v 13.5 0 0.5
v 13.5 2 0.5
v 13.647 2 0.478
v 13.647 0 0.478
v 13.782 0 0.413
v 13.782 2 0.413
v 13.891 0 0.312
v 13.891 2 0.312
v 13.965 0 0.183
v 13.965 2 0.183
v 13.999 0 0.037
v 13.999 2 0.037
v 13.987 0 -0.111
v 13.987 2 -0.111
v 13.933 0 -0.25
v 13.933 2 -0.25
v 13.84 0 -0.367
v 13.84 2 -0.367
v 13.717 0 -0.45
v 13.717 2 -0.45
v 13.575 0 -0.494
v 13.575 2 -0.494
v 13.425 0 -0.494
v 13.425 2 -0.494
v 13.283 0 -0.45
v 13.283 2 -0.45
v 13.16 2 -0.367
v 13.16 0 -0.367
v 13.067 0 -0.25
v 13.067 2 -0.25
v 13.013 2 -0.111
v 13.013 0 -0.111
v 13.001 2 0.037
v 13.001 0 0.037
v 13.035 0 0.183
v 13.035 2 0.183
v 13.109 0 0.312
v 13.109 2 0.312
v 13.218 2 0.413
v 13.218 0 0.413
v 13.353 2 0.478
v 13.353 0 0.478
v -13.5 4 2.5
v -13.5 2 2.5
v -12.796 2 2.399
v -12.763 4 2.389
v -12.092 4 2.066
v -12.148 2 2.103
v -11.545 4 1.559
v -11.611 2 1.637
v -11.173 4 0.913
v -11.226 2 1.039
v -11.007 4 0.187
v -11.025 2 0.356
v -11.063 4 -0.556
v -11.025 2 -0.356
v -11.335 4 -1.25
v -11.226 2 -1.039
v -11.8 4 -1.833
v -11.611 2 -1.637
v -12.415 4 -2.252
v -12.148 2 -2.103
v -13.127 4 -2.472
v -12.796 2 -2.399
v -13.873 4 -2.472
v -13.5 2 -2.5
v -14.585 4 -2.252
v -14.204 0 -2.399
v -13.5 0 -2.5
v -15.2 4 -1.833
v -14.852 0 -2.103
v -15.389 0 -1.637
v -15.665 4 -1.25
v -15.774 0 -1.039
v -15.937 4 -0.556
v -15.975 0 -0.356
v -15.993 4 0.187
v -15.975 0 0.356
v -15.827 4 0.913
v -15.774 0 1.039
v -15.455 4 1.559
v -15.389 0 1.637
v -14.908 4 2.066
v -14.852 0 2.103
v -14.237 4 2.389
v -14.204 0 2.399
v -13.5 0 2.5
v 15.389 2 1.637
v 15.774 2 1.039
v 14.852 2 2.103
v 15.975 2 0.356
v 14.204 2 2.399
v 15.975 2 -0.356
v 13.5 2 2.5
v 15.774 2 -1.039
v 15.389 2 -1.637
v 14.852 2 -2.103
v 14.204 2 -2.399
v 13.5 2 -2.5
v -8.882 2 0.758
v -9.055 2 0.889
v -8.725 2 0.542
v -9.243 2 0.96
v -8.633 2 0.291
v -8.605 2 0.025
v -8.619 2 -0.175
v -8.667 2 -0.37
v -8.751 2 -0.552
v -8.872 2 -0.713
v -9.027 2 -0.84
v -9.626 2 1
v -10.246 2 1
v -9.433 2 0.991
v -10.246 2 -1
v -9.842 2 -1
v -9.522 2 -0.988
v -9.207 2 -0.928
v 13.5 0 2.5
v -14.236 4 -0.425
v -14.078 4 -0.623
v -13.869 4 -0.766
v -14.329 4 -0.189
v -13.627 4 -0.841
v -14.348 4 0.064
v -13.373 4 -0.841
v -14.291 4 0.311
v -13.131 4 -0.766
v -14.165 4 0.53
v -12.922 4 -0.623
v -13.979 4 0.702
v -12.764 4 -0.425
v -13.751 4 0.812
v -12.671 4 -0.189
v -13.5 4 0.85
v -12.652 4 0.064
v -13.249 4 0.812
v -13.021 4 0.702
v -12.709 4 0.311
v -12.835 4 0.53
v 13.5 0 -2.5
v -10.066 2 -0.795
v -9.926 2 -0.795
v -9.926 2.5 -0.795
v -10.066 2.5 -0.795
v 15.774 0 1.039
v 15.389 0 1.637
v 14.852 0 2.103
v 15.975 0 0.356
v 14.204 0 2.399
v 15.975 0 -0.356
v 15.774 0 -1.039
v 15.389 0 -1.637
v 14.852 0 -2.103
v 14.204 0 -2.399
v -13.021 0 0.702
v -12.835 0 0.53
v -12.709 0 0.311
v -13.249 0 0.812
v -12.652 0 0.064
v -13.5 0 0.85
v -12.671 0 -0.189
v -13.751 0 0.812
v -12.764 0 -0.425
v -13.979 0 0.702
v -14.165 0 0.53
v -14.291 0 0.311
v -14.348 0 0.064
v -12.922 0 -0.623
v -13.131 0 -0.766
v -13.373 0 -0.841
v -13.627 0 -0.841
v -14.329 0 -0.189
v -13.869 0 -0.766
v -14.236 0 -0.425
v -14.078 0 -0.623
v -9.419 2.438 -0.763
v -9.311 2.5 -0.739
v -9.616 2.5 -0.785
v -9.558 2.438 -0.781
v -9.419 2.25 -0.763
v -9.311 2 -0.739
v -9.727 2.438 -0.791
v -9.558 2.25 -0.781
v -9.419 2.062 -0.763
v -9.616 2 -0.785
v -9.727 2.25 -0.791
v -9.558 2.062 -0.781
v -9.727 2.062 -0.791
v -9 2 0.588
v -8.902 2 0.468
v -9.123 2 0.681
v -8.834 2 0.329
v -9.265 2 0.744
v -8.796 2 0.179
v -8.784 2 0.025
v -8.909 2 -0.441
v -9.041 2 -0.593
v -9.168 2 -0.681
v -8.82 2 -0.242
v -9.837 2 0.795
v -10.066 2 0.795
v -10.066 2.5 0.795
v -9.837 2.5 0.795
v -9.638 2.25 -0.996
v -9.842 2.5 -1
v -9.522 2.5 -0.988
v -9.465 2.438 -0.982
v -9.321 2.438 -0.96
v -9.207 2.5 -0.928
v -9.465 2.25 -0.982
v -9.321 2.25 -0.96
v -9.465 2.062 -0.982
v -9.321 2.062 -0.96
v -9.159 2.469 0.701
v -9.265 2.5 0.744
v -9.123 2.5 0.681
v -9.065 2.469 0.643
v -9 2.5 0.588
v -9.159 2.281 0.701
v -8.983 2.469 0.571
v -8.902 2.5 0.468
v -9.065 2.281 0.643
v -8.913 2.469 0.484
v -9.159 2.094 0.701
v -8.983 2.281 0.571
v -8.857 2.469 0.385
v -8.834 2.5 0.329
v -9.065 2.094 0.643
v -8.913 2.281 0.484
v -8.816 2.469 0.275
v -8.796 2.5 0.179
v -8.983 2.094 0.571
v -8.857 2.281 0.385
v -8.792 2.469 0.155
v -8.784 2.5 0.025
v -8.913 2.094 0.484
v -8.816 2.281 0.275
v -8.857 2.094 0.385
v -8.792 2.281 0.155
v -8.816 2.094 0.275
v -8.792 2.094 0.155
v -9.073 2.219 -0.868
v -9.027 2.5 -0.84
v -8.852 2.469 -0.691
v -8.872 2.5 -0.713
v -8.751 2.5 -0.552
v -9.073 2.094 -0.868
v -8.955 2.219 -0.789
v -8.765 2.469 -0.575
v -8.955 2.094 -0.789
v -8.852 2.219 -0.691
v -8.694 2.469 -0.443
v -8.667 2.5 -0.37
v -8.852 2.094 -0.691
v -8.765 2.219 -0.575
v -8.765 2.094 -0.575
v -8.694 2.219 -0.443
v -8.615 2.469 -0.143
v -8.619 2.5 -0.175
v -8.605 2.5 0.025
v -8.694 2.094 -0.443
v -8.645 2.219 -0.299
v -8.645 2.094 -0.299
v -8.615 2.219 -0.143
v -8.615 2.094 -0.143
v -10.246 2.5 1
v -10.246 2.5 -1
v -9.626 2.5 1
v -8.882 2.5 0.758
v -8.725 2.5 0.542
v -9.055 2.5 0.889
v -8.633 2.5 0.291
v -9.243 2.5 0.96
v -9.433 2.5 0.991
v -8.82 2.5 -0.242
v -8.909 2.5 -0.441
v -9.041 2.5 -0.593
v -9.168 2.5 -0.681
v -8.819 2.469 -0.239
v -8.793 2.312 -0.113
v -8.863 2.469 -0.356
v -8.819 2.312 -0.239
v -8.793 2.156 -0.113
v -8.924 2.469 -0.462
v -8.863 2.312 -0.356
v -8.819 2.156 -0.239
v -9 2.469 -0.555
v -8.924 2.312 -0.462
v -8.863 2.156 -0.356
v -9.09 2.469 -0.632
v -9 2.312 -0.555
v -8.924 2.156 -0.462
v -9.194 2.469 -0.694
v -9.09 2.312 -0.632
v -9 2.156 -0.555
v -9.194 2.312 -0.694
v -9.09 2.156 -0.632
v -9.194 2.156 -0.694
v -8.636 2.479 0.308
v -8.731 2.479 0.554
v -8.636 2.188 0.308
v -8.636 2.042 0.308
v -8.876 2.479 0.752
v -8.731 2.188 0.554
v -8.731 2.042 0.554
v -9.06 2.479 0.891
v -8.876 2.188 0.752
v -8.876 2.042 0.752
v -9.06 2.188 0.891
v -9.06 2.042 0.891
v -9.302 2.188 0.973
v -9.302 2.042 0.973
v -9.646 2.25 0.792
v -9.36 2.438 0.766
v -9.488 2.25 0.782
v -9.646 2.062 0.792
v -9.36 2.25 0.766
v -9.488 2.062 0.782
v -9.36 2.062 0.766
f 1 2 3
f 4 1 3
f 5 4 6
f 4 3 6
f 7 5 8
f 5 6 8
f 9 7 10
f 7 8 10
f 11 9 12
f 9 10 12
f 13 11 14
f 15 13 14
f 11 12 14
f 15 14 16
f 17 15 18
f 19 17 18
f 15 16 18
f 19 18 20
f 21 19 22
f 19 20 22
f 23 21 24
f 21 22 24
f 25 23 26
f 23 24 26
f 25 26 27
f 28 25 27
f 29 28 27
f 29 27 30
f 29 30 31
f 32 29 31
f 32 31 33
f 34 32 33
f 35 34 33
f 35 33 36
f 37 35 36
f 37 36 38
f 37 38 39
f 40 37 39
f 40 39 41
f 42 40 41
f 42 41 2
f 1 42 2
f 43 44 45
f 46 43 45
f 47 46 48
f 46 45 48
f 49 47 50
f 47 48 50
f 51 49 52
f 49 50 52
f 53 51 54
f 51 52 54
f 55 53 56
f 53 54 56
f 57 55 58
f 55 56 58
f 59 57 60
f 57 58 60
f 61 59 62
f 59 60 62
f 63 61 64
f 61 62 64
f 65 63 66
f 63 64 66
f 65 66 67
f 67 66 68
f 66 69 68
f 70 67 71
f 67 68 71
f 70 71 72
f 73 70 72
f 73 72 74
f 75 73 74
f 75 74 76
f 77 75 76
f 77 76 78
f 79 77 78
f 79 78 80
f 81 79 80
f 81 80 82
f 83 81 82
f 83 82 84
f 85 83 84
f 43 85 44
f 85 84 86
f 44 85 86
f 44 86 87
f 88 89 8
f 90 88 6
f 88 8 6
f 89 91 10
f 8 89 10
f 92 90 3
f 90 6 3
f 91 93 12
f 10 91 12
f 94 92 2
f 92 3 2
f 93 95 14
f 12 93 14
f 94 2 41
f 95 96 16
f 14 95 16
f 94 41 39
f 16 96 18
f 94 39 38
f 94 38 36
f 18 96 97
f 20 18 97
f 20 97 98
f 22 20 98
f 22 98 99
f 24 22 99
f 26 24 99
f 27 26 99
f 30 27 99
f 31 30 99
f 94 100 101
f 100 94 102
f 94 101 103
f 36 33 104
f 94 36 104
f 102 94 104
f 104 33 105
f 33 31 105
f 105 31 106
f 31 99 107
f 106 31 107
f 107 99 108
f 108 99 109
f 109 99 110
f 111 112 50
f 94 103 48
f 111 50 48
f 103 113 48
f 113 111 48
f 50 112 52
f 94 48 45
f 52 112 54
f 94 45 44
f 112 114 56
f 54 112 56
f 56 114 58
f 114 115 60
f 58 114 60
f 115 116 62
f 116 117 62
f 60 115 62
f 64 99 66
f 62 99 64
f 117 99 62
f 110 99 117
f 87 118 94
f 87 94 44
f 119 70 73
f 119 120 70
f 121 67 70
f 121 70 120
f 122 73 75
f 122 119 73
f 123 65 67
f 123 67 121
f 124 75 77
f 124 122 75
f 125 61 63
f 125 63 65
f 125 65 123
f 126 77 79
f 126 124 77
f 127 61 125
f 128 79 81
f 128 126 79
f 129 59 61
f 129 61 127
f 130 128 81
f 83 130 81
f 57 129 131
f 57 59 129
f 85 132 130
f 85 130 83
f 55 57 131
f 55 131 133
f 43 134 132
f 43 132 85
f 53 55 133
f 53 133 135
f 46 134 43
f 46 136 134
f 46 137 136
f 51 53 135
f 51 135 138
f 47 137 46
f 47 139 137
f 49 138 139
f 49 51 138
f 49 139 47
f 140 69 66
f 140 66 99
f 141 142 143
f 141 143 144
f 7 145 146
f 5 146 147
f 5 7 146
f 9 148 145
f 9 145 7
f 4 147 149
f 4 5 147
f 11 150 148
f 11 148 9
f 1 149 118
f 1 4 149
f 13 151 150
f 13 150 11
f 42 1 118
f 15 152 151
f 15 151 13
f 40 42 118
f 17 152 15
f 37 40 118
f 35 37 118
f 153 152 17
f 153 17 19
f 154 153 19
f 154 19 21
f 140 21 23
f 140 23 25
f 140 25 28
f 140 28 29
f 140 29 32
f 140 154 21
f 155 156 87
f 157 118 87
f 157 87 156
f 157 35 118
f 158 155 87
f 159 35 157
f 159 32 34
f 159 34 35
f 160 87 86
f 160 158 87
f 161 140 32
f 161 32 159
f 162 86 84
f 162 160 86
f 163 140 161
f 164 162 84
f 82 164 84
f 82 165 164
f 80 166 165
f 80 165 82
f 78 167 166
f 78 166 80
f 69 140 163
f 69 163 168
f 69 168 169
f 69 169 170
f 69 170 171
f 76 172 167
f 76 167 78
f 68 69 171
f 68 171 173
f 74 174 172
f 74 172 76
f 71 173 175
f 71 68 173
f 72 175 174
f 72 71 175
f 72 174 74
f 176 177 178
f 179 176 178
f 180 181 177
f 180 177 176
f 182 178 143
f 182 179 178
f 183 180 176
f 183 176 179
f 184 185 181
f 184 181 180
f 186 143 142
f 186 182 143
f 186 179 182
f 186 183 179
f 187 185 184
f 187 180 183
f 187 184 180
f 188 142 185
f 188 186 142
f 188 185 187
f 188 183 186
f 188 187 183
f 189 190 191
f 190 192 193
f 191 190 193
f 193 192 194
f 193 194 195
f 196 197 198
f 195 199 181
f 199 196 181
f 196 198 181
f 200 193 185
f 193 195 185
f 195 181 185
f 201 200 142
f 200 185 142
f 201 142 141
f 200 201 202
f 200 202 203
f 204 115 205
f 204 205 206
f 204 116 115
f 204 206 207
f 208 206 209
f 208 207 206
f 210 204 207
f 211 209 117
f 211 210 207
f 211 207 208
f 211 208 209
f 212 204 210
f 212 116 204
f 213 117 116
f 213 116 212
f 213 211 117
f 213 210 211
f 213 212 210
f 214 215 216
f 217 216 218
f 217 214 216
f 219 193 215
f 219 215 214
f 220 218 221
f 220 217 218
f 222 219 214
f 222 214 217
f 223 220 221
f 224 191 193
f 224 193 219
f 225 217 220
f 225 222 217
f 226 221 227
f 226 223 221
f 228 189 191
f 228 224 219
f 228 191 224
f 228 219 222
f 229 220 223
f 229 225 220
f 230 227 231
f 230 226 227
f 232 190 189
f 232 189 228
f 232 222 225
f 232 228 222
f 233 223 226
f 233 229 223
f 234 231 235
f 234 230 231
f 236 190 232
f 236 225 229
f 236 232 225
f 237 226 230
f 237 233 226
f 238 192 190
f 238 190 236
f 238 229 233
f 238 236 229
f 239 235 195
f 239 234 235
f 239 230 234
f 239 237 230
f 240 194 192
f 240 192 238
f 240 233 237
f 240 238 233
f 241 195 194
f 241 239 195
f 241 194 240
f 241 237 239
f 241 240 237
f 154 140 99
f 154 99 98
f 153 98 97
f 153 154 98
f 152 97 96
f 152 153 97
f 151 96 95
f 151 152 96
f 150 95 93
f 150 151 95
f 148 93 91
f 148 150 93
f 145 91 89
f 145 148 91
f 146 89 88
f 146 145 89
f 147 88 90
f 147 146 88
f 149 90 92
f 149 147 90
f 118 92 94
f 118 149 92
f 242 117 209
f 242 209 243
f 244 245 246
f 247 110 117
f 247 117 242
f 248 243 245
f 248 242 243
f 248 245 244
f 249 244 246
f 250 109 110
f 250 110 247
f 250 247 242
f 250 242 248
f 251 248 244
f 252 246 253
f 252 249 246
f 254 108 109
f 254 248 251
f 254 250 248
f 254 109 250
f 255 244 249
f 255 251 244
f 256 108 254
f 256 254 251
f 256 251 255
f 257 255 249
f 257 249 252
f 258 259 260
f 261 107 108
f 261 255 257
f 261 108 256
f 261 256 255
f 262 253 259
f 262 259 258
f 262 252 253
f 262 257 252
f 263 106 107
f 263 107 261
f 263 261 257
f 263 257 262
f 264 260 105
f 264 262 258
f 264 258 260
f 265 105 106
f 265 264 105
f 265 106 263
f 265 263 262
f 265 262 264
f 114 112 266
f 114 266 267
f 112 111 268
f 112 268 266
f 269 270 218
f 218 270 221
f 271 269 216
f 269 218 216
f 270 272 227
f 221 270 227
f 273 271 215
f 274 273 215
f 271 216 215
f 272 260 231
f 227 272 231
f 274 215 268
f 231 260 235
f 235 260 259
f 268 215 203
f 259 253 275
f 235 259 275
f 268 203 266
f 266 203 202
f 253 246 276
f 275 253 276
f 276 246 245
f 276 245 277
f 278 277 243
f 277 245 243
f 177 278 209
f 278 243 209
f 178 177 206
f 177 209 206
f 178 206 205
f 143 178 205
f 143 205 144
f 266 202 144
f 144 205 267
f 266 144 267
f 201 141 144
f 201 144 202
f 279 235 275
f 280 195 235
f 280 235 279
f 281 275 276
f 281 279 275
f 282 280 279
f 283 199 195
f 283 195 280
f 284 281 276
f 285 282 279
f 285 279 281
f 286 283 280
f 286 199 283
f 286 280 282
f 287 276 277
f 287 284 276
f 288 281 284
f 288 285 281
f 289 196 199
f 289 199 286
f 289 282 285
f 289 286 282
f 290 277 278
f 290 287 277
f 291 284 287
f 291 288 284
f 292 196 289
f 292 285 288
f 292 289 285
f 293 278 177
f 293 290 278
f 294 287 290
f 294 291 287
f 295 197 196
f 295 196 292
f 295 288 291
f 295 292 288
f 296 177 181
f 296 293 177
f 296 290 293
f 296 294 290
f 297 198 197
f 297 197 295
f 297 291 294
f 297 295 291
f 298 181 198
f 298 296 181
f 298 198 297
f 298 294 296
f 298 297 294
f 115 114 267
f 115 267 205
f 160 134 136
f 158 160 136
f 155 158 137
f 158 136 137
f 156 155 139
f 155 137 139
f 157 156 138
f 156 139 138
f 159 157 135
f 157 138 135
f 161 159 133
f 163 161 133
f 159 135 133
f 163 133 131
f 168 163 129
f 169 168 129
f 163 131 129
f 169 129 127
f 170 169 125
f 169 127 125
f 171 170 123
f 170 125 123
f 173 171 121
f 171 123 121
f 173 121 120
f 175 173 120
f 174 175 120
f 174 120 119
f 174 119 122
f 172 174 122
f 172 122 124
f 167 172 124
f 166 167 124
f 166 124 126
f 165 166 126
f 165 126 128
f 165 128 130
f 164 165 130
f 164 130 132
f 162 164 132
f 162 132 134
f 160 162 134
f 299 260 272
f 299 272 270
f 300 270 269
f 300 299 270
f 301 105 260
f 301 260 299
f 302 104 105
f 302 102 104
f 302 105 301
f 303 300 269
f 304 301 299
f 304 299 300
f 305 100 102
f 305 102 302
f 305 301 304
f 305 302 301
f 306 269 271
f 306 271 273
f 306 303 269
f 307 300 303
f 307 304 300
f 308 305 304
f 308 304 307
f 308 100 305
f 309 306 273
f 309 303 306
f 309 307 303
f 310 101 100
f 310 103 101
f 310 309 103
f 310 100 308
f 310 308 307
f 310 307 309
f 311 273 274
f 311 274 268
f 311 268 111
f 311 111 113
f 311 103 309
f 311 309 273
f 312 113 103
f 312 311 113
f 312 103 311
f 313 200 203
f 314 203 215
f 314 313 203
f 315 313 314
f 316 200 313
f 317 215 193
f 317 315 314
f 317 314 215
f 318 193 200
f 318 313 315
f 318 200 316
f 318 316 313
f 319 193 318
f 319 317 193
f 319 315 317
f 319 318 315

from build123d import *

# Parameters (mm, degrees)
RESSALTO_EXTRUS_O1_DEPTH = 2
ESBO_O4_R                = 2.5
RESSALTO_EXTRUS_O2_DEPTH = 2
ESBO_O2_R                = 0.85
CORTE_EXTRUS_O1_DEPTH    = 17.680827318
CORTE_EXTRUS_O2_REACH    = 18.317
ESBO_O3_R                = 0.5
RESSALTO_EXTRUS_O3_DEPTH = 0.5


with BuildPart() as part:
    # Esboço1 → Ressalto-extrusão1 (new body)
    with BuildSketch(Plane(origin=(0, 0, 0), x_dir=(1, 0, 0), z_dir=(0, 1, 0))):
        with BuildLine():
            Line((-13.5, 2.5), (13.5, 2.5))
            ThreePointArc((13.5, 2.5), (16, 0), (13.5, -2.5))
            Line((13.5, -2.5), (-13.5, -2.5))
            ThreePointArc((-13.5, -2.5), (-16, 0), (-13.5, 2.5))
        make_face()
    extrude(amount=RESSALTO_EXTRUS_O1_DEPTH)

    # Esboço4 → Ressalto-extrusão2 (add)
    with BuildSketch(Plane(origin=(0, 2, 0), x_dir=(1, 0, 0), z_dir=(0, 1, 0))):
        with Locations(Location((-13.5, 0, 0), (0, 0, 270))):
            Circle(ESBO_O4_R)
    extrude(amount=RESSALTO_EXTRUS_O2_DEPTH)

    # Esboço2 → Corte-extrusão1 (cut, through all)
    with BuildSketch(Plane(origin=(0, 4, 0), x_dir=(1, 0, 0), z_dir=(0, 1, 0))):
        with Locations(Location((-13.5, 0, 0), (0, 0, 270))):
            Circle(ESBO_O2_R)
    extrude(amount=-CORTE_EXTRUS_O1_DEPTH, mode=Mode.SUBTRACT)

    # Esboço3 → Corte-extrusão2 (cut, up to next)
    with BuildSketch(Plane(origin=(0, 2, 0), x_dir=(1, 0, 0), z_dir=(0, 1, 0)), mode=Mode.PRIVATE) as corte_extrus_o2_sk1:
        with Locations(Location((13.5, 0, 0), (0, 0, 270))):
            Circle(ESBO_O3_R)
    corte_extrus_o2_tool1 = extrude(corte_extrus_o2_sk1.sketch, amount=-CORTE_EXTRUS_O2_REACH, mode=Mode.PRIVATE) & part.part
    add(corte_extrus_o2_tool1.solids().sort_by_distance((13.5, 2, 0))[0], mode=Mode.SUBTRACT)

    # Esboço5 → Ressalto-extrusão3 (add)
    with BuildSketch(Plane(origin=(0, 2, 0), x_dir=(1, 0, 0), z_dir=(0, 1, 0))):
        with BuildLine():
            Line((-10.245767212, -1), (-10.245767212, 1))
            Line((-10.245767212, 1), (-9.841921058, 1))
            add(Edge.make_bspline(
                [(-9.841921058, 1), (-9.806795922, 0.999747103), (-9.738934342, 0.999258507), (-9.640870086, 0.996160569), (-9.550136507, 0.990680303), (-9.467032017, 0.982697717), (-9.391328467, 0.972895983), (-9.323237834, 0.960610038), (-9.262408038, 0.946102512), (-9.224996929, 0.933733683), (-9.207305673, 0.927884615)],
                knots=[0, 0, 0, 0, 1.314313732, 2.53924729, 3.670748893, 4.714932338, 5.66265055, 6.526160246, 7.303039223, 8, 8, 8, 8], degree=3))
            add(Edge.make_bspline(
                [(-9.207305673, 0.927884615), (-9.184165822, 0.919067069), (-9.138410855, 0.90163193), (-9.073263928, 0.868742615), (-9.011935149, 0.831477985), (-8.954095638, 0.789788921), (-8.901066594, 0.742495007), (-8.850776368, 0.691605244), (-8.80528224, 0.63526905), (-8.763620356, 0.574654771), (-8.726057122, 0.510476455), (-8.693406175, 0.442856393), (-8.666289607, 0.372137989), (-8.643779192, 0.298517904), (-8.626038359, 0.22183426), (-8.613934398, 0.141997765), (-8.605950975, 0.059323942), (-8.60514866, 0.003224249), (-8.604741571, -0.025240385)],
                knots=[0, 0, 0, 0, 0.984719456, 1.947108742, 2.898477687, 3.838006223, 4.779231079, 5.722358779, 6.681677486, 7.655904652, 8.64651281, 9.637519902, 10.640069247, 11.656948941, 12.698408672, 13.768548281, 14.867775369, 16, 16, 16, 16], degree=3))
            add(Edge.make_bspline(
                [(-8.604741571, -0.025240385), (-8.605100981, -0.049961092), (-8.605809236, -0.098675829), (-8.612168845, -0.170470626), (-8.621412456, -0.240135524), (-8.635723426, -0.307338781), (-8.653096291, -0.372669192), (-8.675361521, -0.435430474), (-8.700867518, -0.496198365), (-8.730610306, -0.554151209), (-8.763262526, -0.609055993), (-8.798303522, -0.660813437), (-8.83569592, -0.708684993), (-8.875796281, -0.752815628), (-8.918086405, -0.793138816), (-8.962843165, -0.829991396), (-9.010182051, -0.862652284), (-9.059891036, -0.892404918), (-9.113420253, -0.918359407), (-9.171783605, -0.940319412), (-9.235229992, -0.958517478), (-9.303603682, -0.973700847), (-9.377022812, -0.98574502), (-9.455559364, -0.993817244), (-9.539092672, -0.999276063), (-9.596452252, -0.999754002), (-9.625975545, -1)],
                knots=[0, 0, 0, 0, 1.105936401, 2.179363191, 3.223086493, 4.248585256, 5.251745608, 6.245858792, 7.225916811, 8.198733463, 9.158002045, 10.082870192, 10.993790845, 11.873723703, 12.748670949, 13.606408763, 14.465103618, 15.319838547, 16.196477973, 17.123216899, 18.106603292, 19.147568657, 20.255746949, 21.433717677, 22.679120308, 24, 24, 24, 24], degree=3))
            Line((-9.625975545, -1), (-10.245767212, -1))
        make_face()
        with BuildLine():
            Line((-10.066280032, -0.794871795), (-9.836712725, -0.794871795))
            add(Edge.make_bspline(
                [(-9.836712725, -0.794871795), (-9.803725084, -0.794730026), (-9.740277771, -0.794457351), (-9.64904463, -0.792064664), (-9.565684974, -0.788154985), (-9.490186969, -0.782683512), (-9.422593241, -0.775444303), (-9.362762527, -0.76737293), (-9.31089095, -0.757317244), (-9.279502701, -0.74820241), (-9.264997981, -0.743990385)],
                knots=[0, 0, 0, 0, 1.375205317, 2.645023457, 3.804390687, 4.853969522, 5.800190428, 6.637939096, 7.370582563, 8, 8, 8, 8], degree=3))
            add(Edge.make_bspline(
                [(-9.264997981, -0.743990385), (-9.246741774, -0.737560923), (-9.21066541, -0.724855567), (-9.158733361, -0.70167976), (-9.110300787, -0.674227149), (-9.064523629, -0.643711564), (-9.022051255, -0.609056706), (-8.982380331, -0.57101614), (-8.945590731, -0.529396269), (-8.912062555, -0.484248748), (-8.882057809, -0.435854579), (-8.85607425, -0.384689531), (-8.833301946, -0.331314211), (-8.815428464, -0.274908978), (-8.801419559, -0.215978087), (-8.79149688, -0.154517394), (-8.785317038, -0.090538376), (-8.78459621, -0.047022876), (-8.78422875, -0.024839744)],
                knots=[0, 0, 0, 0, 0.998632004, 1.973411704, 2.929992603, 3.868527914, 4.809262121, 5.754881198, 6.702106254, 7.672490631, 8.653608572, 9.636854334, 10.631411391, 11.644891563, 12.686317036, 13.754757253, 14.855430412, 16, 16, 16, 16], degree=3))
            add(Edge.make_bspline(
                [(-8.78422875, -0.024839744), (-8.784522057, -0.001449183), (-8.785098262, 0.044501779), (-8.792340725, 0.111925034), (-8.802924471, 0.17677112), (-8.818229434, 0.239044374), (-8.837732794, 0.29886629), (-8.862072589, 0.35590601), (-8.889882086, 0.410765935), (-8.922969707, 0.462179858), (-8.959207189, 0.510804492), (-8.99942312, 0.555350158), (-9.04297857, 0.595918329), (-9.089398484, 0.633140794), (-9.139991112, 0.665520037), (-9.19356465, 0.694483855), (-9.250905033, 0.719064364), (-9.290798003, 0.732138), (-9.311071699, 0.738782051)],
                knots=[0, 0, 0, 0, 1.122418816, 2.205001699, 3.251619955, 4.274784885, 5.280384055, 6.268708349, 7.249350384, 8.229342522, 9.199999885, 10.157847722, 11.105861043, 12.055065948, 13.010012805, 13.98527497, 14.976112212, 16, 16, 16, 16], degree=3))
            add(Edge.make_bspline(
                [(-9.311071699, 0.738782051), (-9.327843783, 0.74342001), (-9.363505834, 0.753281583), (-9.421699814, 0.764038939), (-9.487194185, 0.773527224), (-9.560279728, 0.781560389), (-9.640873134, 0.787324573), (-9.729036384, 0.791651038), (-9.824807586, 0.794569114), (-9.891197606, 0.794768375), (-9.925655032, 0.794871795)],
                knots=[0, 0, 0, 0, 0.674548936, 1.434276114, 2.292660221, 3.240891867, 4.284742987, 5.42552168, 6.663806718, 8, 8, 8, 8], degree=3))
            Line((-9.925655032, 0.794871795), (-10.066280032, 0.794871795))
            Line((-10.066280032, 0.794871795), (-10.066280032, -0.794871795))
        make_face(mode=Mode.SUBTRACT)
    extrude(amount=RESSALTO_EXTRUS_O3_DEPTH)


solid = part.part
